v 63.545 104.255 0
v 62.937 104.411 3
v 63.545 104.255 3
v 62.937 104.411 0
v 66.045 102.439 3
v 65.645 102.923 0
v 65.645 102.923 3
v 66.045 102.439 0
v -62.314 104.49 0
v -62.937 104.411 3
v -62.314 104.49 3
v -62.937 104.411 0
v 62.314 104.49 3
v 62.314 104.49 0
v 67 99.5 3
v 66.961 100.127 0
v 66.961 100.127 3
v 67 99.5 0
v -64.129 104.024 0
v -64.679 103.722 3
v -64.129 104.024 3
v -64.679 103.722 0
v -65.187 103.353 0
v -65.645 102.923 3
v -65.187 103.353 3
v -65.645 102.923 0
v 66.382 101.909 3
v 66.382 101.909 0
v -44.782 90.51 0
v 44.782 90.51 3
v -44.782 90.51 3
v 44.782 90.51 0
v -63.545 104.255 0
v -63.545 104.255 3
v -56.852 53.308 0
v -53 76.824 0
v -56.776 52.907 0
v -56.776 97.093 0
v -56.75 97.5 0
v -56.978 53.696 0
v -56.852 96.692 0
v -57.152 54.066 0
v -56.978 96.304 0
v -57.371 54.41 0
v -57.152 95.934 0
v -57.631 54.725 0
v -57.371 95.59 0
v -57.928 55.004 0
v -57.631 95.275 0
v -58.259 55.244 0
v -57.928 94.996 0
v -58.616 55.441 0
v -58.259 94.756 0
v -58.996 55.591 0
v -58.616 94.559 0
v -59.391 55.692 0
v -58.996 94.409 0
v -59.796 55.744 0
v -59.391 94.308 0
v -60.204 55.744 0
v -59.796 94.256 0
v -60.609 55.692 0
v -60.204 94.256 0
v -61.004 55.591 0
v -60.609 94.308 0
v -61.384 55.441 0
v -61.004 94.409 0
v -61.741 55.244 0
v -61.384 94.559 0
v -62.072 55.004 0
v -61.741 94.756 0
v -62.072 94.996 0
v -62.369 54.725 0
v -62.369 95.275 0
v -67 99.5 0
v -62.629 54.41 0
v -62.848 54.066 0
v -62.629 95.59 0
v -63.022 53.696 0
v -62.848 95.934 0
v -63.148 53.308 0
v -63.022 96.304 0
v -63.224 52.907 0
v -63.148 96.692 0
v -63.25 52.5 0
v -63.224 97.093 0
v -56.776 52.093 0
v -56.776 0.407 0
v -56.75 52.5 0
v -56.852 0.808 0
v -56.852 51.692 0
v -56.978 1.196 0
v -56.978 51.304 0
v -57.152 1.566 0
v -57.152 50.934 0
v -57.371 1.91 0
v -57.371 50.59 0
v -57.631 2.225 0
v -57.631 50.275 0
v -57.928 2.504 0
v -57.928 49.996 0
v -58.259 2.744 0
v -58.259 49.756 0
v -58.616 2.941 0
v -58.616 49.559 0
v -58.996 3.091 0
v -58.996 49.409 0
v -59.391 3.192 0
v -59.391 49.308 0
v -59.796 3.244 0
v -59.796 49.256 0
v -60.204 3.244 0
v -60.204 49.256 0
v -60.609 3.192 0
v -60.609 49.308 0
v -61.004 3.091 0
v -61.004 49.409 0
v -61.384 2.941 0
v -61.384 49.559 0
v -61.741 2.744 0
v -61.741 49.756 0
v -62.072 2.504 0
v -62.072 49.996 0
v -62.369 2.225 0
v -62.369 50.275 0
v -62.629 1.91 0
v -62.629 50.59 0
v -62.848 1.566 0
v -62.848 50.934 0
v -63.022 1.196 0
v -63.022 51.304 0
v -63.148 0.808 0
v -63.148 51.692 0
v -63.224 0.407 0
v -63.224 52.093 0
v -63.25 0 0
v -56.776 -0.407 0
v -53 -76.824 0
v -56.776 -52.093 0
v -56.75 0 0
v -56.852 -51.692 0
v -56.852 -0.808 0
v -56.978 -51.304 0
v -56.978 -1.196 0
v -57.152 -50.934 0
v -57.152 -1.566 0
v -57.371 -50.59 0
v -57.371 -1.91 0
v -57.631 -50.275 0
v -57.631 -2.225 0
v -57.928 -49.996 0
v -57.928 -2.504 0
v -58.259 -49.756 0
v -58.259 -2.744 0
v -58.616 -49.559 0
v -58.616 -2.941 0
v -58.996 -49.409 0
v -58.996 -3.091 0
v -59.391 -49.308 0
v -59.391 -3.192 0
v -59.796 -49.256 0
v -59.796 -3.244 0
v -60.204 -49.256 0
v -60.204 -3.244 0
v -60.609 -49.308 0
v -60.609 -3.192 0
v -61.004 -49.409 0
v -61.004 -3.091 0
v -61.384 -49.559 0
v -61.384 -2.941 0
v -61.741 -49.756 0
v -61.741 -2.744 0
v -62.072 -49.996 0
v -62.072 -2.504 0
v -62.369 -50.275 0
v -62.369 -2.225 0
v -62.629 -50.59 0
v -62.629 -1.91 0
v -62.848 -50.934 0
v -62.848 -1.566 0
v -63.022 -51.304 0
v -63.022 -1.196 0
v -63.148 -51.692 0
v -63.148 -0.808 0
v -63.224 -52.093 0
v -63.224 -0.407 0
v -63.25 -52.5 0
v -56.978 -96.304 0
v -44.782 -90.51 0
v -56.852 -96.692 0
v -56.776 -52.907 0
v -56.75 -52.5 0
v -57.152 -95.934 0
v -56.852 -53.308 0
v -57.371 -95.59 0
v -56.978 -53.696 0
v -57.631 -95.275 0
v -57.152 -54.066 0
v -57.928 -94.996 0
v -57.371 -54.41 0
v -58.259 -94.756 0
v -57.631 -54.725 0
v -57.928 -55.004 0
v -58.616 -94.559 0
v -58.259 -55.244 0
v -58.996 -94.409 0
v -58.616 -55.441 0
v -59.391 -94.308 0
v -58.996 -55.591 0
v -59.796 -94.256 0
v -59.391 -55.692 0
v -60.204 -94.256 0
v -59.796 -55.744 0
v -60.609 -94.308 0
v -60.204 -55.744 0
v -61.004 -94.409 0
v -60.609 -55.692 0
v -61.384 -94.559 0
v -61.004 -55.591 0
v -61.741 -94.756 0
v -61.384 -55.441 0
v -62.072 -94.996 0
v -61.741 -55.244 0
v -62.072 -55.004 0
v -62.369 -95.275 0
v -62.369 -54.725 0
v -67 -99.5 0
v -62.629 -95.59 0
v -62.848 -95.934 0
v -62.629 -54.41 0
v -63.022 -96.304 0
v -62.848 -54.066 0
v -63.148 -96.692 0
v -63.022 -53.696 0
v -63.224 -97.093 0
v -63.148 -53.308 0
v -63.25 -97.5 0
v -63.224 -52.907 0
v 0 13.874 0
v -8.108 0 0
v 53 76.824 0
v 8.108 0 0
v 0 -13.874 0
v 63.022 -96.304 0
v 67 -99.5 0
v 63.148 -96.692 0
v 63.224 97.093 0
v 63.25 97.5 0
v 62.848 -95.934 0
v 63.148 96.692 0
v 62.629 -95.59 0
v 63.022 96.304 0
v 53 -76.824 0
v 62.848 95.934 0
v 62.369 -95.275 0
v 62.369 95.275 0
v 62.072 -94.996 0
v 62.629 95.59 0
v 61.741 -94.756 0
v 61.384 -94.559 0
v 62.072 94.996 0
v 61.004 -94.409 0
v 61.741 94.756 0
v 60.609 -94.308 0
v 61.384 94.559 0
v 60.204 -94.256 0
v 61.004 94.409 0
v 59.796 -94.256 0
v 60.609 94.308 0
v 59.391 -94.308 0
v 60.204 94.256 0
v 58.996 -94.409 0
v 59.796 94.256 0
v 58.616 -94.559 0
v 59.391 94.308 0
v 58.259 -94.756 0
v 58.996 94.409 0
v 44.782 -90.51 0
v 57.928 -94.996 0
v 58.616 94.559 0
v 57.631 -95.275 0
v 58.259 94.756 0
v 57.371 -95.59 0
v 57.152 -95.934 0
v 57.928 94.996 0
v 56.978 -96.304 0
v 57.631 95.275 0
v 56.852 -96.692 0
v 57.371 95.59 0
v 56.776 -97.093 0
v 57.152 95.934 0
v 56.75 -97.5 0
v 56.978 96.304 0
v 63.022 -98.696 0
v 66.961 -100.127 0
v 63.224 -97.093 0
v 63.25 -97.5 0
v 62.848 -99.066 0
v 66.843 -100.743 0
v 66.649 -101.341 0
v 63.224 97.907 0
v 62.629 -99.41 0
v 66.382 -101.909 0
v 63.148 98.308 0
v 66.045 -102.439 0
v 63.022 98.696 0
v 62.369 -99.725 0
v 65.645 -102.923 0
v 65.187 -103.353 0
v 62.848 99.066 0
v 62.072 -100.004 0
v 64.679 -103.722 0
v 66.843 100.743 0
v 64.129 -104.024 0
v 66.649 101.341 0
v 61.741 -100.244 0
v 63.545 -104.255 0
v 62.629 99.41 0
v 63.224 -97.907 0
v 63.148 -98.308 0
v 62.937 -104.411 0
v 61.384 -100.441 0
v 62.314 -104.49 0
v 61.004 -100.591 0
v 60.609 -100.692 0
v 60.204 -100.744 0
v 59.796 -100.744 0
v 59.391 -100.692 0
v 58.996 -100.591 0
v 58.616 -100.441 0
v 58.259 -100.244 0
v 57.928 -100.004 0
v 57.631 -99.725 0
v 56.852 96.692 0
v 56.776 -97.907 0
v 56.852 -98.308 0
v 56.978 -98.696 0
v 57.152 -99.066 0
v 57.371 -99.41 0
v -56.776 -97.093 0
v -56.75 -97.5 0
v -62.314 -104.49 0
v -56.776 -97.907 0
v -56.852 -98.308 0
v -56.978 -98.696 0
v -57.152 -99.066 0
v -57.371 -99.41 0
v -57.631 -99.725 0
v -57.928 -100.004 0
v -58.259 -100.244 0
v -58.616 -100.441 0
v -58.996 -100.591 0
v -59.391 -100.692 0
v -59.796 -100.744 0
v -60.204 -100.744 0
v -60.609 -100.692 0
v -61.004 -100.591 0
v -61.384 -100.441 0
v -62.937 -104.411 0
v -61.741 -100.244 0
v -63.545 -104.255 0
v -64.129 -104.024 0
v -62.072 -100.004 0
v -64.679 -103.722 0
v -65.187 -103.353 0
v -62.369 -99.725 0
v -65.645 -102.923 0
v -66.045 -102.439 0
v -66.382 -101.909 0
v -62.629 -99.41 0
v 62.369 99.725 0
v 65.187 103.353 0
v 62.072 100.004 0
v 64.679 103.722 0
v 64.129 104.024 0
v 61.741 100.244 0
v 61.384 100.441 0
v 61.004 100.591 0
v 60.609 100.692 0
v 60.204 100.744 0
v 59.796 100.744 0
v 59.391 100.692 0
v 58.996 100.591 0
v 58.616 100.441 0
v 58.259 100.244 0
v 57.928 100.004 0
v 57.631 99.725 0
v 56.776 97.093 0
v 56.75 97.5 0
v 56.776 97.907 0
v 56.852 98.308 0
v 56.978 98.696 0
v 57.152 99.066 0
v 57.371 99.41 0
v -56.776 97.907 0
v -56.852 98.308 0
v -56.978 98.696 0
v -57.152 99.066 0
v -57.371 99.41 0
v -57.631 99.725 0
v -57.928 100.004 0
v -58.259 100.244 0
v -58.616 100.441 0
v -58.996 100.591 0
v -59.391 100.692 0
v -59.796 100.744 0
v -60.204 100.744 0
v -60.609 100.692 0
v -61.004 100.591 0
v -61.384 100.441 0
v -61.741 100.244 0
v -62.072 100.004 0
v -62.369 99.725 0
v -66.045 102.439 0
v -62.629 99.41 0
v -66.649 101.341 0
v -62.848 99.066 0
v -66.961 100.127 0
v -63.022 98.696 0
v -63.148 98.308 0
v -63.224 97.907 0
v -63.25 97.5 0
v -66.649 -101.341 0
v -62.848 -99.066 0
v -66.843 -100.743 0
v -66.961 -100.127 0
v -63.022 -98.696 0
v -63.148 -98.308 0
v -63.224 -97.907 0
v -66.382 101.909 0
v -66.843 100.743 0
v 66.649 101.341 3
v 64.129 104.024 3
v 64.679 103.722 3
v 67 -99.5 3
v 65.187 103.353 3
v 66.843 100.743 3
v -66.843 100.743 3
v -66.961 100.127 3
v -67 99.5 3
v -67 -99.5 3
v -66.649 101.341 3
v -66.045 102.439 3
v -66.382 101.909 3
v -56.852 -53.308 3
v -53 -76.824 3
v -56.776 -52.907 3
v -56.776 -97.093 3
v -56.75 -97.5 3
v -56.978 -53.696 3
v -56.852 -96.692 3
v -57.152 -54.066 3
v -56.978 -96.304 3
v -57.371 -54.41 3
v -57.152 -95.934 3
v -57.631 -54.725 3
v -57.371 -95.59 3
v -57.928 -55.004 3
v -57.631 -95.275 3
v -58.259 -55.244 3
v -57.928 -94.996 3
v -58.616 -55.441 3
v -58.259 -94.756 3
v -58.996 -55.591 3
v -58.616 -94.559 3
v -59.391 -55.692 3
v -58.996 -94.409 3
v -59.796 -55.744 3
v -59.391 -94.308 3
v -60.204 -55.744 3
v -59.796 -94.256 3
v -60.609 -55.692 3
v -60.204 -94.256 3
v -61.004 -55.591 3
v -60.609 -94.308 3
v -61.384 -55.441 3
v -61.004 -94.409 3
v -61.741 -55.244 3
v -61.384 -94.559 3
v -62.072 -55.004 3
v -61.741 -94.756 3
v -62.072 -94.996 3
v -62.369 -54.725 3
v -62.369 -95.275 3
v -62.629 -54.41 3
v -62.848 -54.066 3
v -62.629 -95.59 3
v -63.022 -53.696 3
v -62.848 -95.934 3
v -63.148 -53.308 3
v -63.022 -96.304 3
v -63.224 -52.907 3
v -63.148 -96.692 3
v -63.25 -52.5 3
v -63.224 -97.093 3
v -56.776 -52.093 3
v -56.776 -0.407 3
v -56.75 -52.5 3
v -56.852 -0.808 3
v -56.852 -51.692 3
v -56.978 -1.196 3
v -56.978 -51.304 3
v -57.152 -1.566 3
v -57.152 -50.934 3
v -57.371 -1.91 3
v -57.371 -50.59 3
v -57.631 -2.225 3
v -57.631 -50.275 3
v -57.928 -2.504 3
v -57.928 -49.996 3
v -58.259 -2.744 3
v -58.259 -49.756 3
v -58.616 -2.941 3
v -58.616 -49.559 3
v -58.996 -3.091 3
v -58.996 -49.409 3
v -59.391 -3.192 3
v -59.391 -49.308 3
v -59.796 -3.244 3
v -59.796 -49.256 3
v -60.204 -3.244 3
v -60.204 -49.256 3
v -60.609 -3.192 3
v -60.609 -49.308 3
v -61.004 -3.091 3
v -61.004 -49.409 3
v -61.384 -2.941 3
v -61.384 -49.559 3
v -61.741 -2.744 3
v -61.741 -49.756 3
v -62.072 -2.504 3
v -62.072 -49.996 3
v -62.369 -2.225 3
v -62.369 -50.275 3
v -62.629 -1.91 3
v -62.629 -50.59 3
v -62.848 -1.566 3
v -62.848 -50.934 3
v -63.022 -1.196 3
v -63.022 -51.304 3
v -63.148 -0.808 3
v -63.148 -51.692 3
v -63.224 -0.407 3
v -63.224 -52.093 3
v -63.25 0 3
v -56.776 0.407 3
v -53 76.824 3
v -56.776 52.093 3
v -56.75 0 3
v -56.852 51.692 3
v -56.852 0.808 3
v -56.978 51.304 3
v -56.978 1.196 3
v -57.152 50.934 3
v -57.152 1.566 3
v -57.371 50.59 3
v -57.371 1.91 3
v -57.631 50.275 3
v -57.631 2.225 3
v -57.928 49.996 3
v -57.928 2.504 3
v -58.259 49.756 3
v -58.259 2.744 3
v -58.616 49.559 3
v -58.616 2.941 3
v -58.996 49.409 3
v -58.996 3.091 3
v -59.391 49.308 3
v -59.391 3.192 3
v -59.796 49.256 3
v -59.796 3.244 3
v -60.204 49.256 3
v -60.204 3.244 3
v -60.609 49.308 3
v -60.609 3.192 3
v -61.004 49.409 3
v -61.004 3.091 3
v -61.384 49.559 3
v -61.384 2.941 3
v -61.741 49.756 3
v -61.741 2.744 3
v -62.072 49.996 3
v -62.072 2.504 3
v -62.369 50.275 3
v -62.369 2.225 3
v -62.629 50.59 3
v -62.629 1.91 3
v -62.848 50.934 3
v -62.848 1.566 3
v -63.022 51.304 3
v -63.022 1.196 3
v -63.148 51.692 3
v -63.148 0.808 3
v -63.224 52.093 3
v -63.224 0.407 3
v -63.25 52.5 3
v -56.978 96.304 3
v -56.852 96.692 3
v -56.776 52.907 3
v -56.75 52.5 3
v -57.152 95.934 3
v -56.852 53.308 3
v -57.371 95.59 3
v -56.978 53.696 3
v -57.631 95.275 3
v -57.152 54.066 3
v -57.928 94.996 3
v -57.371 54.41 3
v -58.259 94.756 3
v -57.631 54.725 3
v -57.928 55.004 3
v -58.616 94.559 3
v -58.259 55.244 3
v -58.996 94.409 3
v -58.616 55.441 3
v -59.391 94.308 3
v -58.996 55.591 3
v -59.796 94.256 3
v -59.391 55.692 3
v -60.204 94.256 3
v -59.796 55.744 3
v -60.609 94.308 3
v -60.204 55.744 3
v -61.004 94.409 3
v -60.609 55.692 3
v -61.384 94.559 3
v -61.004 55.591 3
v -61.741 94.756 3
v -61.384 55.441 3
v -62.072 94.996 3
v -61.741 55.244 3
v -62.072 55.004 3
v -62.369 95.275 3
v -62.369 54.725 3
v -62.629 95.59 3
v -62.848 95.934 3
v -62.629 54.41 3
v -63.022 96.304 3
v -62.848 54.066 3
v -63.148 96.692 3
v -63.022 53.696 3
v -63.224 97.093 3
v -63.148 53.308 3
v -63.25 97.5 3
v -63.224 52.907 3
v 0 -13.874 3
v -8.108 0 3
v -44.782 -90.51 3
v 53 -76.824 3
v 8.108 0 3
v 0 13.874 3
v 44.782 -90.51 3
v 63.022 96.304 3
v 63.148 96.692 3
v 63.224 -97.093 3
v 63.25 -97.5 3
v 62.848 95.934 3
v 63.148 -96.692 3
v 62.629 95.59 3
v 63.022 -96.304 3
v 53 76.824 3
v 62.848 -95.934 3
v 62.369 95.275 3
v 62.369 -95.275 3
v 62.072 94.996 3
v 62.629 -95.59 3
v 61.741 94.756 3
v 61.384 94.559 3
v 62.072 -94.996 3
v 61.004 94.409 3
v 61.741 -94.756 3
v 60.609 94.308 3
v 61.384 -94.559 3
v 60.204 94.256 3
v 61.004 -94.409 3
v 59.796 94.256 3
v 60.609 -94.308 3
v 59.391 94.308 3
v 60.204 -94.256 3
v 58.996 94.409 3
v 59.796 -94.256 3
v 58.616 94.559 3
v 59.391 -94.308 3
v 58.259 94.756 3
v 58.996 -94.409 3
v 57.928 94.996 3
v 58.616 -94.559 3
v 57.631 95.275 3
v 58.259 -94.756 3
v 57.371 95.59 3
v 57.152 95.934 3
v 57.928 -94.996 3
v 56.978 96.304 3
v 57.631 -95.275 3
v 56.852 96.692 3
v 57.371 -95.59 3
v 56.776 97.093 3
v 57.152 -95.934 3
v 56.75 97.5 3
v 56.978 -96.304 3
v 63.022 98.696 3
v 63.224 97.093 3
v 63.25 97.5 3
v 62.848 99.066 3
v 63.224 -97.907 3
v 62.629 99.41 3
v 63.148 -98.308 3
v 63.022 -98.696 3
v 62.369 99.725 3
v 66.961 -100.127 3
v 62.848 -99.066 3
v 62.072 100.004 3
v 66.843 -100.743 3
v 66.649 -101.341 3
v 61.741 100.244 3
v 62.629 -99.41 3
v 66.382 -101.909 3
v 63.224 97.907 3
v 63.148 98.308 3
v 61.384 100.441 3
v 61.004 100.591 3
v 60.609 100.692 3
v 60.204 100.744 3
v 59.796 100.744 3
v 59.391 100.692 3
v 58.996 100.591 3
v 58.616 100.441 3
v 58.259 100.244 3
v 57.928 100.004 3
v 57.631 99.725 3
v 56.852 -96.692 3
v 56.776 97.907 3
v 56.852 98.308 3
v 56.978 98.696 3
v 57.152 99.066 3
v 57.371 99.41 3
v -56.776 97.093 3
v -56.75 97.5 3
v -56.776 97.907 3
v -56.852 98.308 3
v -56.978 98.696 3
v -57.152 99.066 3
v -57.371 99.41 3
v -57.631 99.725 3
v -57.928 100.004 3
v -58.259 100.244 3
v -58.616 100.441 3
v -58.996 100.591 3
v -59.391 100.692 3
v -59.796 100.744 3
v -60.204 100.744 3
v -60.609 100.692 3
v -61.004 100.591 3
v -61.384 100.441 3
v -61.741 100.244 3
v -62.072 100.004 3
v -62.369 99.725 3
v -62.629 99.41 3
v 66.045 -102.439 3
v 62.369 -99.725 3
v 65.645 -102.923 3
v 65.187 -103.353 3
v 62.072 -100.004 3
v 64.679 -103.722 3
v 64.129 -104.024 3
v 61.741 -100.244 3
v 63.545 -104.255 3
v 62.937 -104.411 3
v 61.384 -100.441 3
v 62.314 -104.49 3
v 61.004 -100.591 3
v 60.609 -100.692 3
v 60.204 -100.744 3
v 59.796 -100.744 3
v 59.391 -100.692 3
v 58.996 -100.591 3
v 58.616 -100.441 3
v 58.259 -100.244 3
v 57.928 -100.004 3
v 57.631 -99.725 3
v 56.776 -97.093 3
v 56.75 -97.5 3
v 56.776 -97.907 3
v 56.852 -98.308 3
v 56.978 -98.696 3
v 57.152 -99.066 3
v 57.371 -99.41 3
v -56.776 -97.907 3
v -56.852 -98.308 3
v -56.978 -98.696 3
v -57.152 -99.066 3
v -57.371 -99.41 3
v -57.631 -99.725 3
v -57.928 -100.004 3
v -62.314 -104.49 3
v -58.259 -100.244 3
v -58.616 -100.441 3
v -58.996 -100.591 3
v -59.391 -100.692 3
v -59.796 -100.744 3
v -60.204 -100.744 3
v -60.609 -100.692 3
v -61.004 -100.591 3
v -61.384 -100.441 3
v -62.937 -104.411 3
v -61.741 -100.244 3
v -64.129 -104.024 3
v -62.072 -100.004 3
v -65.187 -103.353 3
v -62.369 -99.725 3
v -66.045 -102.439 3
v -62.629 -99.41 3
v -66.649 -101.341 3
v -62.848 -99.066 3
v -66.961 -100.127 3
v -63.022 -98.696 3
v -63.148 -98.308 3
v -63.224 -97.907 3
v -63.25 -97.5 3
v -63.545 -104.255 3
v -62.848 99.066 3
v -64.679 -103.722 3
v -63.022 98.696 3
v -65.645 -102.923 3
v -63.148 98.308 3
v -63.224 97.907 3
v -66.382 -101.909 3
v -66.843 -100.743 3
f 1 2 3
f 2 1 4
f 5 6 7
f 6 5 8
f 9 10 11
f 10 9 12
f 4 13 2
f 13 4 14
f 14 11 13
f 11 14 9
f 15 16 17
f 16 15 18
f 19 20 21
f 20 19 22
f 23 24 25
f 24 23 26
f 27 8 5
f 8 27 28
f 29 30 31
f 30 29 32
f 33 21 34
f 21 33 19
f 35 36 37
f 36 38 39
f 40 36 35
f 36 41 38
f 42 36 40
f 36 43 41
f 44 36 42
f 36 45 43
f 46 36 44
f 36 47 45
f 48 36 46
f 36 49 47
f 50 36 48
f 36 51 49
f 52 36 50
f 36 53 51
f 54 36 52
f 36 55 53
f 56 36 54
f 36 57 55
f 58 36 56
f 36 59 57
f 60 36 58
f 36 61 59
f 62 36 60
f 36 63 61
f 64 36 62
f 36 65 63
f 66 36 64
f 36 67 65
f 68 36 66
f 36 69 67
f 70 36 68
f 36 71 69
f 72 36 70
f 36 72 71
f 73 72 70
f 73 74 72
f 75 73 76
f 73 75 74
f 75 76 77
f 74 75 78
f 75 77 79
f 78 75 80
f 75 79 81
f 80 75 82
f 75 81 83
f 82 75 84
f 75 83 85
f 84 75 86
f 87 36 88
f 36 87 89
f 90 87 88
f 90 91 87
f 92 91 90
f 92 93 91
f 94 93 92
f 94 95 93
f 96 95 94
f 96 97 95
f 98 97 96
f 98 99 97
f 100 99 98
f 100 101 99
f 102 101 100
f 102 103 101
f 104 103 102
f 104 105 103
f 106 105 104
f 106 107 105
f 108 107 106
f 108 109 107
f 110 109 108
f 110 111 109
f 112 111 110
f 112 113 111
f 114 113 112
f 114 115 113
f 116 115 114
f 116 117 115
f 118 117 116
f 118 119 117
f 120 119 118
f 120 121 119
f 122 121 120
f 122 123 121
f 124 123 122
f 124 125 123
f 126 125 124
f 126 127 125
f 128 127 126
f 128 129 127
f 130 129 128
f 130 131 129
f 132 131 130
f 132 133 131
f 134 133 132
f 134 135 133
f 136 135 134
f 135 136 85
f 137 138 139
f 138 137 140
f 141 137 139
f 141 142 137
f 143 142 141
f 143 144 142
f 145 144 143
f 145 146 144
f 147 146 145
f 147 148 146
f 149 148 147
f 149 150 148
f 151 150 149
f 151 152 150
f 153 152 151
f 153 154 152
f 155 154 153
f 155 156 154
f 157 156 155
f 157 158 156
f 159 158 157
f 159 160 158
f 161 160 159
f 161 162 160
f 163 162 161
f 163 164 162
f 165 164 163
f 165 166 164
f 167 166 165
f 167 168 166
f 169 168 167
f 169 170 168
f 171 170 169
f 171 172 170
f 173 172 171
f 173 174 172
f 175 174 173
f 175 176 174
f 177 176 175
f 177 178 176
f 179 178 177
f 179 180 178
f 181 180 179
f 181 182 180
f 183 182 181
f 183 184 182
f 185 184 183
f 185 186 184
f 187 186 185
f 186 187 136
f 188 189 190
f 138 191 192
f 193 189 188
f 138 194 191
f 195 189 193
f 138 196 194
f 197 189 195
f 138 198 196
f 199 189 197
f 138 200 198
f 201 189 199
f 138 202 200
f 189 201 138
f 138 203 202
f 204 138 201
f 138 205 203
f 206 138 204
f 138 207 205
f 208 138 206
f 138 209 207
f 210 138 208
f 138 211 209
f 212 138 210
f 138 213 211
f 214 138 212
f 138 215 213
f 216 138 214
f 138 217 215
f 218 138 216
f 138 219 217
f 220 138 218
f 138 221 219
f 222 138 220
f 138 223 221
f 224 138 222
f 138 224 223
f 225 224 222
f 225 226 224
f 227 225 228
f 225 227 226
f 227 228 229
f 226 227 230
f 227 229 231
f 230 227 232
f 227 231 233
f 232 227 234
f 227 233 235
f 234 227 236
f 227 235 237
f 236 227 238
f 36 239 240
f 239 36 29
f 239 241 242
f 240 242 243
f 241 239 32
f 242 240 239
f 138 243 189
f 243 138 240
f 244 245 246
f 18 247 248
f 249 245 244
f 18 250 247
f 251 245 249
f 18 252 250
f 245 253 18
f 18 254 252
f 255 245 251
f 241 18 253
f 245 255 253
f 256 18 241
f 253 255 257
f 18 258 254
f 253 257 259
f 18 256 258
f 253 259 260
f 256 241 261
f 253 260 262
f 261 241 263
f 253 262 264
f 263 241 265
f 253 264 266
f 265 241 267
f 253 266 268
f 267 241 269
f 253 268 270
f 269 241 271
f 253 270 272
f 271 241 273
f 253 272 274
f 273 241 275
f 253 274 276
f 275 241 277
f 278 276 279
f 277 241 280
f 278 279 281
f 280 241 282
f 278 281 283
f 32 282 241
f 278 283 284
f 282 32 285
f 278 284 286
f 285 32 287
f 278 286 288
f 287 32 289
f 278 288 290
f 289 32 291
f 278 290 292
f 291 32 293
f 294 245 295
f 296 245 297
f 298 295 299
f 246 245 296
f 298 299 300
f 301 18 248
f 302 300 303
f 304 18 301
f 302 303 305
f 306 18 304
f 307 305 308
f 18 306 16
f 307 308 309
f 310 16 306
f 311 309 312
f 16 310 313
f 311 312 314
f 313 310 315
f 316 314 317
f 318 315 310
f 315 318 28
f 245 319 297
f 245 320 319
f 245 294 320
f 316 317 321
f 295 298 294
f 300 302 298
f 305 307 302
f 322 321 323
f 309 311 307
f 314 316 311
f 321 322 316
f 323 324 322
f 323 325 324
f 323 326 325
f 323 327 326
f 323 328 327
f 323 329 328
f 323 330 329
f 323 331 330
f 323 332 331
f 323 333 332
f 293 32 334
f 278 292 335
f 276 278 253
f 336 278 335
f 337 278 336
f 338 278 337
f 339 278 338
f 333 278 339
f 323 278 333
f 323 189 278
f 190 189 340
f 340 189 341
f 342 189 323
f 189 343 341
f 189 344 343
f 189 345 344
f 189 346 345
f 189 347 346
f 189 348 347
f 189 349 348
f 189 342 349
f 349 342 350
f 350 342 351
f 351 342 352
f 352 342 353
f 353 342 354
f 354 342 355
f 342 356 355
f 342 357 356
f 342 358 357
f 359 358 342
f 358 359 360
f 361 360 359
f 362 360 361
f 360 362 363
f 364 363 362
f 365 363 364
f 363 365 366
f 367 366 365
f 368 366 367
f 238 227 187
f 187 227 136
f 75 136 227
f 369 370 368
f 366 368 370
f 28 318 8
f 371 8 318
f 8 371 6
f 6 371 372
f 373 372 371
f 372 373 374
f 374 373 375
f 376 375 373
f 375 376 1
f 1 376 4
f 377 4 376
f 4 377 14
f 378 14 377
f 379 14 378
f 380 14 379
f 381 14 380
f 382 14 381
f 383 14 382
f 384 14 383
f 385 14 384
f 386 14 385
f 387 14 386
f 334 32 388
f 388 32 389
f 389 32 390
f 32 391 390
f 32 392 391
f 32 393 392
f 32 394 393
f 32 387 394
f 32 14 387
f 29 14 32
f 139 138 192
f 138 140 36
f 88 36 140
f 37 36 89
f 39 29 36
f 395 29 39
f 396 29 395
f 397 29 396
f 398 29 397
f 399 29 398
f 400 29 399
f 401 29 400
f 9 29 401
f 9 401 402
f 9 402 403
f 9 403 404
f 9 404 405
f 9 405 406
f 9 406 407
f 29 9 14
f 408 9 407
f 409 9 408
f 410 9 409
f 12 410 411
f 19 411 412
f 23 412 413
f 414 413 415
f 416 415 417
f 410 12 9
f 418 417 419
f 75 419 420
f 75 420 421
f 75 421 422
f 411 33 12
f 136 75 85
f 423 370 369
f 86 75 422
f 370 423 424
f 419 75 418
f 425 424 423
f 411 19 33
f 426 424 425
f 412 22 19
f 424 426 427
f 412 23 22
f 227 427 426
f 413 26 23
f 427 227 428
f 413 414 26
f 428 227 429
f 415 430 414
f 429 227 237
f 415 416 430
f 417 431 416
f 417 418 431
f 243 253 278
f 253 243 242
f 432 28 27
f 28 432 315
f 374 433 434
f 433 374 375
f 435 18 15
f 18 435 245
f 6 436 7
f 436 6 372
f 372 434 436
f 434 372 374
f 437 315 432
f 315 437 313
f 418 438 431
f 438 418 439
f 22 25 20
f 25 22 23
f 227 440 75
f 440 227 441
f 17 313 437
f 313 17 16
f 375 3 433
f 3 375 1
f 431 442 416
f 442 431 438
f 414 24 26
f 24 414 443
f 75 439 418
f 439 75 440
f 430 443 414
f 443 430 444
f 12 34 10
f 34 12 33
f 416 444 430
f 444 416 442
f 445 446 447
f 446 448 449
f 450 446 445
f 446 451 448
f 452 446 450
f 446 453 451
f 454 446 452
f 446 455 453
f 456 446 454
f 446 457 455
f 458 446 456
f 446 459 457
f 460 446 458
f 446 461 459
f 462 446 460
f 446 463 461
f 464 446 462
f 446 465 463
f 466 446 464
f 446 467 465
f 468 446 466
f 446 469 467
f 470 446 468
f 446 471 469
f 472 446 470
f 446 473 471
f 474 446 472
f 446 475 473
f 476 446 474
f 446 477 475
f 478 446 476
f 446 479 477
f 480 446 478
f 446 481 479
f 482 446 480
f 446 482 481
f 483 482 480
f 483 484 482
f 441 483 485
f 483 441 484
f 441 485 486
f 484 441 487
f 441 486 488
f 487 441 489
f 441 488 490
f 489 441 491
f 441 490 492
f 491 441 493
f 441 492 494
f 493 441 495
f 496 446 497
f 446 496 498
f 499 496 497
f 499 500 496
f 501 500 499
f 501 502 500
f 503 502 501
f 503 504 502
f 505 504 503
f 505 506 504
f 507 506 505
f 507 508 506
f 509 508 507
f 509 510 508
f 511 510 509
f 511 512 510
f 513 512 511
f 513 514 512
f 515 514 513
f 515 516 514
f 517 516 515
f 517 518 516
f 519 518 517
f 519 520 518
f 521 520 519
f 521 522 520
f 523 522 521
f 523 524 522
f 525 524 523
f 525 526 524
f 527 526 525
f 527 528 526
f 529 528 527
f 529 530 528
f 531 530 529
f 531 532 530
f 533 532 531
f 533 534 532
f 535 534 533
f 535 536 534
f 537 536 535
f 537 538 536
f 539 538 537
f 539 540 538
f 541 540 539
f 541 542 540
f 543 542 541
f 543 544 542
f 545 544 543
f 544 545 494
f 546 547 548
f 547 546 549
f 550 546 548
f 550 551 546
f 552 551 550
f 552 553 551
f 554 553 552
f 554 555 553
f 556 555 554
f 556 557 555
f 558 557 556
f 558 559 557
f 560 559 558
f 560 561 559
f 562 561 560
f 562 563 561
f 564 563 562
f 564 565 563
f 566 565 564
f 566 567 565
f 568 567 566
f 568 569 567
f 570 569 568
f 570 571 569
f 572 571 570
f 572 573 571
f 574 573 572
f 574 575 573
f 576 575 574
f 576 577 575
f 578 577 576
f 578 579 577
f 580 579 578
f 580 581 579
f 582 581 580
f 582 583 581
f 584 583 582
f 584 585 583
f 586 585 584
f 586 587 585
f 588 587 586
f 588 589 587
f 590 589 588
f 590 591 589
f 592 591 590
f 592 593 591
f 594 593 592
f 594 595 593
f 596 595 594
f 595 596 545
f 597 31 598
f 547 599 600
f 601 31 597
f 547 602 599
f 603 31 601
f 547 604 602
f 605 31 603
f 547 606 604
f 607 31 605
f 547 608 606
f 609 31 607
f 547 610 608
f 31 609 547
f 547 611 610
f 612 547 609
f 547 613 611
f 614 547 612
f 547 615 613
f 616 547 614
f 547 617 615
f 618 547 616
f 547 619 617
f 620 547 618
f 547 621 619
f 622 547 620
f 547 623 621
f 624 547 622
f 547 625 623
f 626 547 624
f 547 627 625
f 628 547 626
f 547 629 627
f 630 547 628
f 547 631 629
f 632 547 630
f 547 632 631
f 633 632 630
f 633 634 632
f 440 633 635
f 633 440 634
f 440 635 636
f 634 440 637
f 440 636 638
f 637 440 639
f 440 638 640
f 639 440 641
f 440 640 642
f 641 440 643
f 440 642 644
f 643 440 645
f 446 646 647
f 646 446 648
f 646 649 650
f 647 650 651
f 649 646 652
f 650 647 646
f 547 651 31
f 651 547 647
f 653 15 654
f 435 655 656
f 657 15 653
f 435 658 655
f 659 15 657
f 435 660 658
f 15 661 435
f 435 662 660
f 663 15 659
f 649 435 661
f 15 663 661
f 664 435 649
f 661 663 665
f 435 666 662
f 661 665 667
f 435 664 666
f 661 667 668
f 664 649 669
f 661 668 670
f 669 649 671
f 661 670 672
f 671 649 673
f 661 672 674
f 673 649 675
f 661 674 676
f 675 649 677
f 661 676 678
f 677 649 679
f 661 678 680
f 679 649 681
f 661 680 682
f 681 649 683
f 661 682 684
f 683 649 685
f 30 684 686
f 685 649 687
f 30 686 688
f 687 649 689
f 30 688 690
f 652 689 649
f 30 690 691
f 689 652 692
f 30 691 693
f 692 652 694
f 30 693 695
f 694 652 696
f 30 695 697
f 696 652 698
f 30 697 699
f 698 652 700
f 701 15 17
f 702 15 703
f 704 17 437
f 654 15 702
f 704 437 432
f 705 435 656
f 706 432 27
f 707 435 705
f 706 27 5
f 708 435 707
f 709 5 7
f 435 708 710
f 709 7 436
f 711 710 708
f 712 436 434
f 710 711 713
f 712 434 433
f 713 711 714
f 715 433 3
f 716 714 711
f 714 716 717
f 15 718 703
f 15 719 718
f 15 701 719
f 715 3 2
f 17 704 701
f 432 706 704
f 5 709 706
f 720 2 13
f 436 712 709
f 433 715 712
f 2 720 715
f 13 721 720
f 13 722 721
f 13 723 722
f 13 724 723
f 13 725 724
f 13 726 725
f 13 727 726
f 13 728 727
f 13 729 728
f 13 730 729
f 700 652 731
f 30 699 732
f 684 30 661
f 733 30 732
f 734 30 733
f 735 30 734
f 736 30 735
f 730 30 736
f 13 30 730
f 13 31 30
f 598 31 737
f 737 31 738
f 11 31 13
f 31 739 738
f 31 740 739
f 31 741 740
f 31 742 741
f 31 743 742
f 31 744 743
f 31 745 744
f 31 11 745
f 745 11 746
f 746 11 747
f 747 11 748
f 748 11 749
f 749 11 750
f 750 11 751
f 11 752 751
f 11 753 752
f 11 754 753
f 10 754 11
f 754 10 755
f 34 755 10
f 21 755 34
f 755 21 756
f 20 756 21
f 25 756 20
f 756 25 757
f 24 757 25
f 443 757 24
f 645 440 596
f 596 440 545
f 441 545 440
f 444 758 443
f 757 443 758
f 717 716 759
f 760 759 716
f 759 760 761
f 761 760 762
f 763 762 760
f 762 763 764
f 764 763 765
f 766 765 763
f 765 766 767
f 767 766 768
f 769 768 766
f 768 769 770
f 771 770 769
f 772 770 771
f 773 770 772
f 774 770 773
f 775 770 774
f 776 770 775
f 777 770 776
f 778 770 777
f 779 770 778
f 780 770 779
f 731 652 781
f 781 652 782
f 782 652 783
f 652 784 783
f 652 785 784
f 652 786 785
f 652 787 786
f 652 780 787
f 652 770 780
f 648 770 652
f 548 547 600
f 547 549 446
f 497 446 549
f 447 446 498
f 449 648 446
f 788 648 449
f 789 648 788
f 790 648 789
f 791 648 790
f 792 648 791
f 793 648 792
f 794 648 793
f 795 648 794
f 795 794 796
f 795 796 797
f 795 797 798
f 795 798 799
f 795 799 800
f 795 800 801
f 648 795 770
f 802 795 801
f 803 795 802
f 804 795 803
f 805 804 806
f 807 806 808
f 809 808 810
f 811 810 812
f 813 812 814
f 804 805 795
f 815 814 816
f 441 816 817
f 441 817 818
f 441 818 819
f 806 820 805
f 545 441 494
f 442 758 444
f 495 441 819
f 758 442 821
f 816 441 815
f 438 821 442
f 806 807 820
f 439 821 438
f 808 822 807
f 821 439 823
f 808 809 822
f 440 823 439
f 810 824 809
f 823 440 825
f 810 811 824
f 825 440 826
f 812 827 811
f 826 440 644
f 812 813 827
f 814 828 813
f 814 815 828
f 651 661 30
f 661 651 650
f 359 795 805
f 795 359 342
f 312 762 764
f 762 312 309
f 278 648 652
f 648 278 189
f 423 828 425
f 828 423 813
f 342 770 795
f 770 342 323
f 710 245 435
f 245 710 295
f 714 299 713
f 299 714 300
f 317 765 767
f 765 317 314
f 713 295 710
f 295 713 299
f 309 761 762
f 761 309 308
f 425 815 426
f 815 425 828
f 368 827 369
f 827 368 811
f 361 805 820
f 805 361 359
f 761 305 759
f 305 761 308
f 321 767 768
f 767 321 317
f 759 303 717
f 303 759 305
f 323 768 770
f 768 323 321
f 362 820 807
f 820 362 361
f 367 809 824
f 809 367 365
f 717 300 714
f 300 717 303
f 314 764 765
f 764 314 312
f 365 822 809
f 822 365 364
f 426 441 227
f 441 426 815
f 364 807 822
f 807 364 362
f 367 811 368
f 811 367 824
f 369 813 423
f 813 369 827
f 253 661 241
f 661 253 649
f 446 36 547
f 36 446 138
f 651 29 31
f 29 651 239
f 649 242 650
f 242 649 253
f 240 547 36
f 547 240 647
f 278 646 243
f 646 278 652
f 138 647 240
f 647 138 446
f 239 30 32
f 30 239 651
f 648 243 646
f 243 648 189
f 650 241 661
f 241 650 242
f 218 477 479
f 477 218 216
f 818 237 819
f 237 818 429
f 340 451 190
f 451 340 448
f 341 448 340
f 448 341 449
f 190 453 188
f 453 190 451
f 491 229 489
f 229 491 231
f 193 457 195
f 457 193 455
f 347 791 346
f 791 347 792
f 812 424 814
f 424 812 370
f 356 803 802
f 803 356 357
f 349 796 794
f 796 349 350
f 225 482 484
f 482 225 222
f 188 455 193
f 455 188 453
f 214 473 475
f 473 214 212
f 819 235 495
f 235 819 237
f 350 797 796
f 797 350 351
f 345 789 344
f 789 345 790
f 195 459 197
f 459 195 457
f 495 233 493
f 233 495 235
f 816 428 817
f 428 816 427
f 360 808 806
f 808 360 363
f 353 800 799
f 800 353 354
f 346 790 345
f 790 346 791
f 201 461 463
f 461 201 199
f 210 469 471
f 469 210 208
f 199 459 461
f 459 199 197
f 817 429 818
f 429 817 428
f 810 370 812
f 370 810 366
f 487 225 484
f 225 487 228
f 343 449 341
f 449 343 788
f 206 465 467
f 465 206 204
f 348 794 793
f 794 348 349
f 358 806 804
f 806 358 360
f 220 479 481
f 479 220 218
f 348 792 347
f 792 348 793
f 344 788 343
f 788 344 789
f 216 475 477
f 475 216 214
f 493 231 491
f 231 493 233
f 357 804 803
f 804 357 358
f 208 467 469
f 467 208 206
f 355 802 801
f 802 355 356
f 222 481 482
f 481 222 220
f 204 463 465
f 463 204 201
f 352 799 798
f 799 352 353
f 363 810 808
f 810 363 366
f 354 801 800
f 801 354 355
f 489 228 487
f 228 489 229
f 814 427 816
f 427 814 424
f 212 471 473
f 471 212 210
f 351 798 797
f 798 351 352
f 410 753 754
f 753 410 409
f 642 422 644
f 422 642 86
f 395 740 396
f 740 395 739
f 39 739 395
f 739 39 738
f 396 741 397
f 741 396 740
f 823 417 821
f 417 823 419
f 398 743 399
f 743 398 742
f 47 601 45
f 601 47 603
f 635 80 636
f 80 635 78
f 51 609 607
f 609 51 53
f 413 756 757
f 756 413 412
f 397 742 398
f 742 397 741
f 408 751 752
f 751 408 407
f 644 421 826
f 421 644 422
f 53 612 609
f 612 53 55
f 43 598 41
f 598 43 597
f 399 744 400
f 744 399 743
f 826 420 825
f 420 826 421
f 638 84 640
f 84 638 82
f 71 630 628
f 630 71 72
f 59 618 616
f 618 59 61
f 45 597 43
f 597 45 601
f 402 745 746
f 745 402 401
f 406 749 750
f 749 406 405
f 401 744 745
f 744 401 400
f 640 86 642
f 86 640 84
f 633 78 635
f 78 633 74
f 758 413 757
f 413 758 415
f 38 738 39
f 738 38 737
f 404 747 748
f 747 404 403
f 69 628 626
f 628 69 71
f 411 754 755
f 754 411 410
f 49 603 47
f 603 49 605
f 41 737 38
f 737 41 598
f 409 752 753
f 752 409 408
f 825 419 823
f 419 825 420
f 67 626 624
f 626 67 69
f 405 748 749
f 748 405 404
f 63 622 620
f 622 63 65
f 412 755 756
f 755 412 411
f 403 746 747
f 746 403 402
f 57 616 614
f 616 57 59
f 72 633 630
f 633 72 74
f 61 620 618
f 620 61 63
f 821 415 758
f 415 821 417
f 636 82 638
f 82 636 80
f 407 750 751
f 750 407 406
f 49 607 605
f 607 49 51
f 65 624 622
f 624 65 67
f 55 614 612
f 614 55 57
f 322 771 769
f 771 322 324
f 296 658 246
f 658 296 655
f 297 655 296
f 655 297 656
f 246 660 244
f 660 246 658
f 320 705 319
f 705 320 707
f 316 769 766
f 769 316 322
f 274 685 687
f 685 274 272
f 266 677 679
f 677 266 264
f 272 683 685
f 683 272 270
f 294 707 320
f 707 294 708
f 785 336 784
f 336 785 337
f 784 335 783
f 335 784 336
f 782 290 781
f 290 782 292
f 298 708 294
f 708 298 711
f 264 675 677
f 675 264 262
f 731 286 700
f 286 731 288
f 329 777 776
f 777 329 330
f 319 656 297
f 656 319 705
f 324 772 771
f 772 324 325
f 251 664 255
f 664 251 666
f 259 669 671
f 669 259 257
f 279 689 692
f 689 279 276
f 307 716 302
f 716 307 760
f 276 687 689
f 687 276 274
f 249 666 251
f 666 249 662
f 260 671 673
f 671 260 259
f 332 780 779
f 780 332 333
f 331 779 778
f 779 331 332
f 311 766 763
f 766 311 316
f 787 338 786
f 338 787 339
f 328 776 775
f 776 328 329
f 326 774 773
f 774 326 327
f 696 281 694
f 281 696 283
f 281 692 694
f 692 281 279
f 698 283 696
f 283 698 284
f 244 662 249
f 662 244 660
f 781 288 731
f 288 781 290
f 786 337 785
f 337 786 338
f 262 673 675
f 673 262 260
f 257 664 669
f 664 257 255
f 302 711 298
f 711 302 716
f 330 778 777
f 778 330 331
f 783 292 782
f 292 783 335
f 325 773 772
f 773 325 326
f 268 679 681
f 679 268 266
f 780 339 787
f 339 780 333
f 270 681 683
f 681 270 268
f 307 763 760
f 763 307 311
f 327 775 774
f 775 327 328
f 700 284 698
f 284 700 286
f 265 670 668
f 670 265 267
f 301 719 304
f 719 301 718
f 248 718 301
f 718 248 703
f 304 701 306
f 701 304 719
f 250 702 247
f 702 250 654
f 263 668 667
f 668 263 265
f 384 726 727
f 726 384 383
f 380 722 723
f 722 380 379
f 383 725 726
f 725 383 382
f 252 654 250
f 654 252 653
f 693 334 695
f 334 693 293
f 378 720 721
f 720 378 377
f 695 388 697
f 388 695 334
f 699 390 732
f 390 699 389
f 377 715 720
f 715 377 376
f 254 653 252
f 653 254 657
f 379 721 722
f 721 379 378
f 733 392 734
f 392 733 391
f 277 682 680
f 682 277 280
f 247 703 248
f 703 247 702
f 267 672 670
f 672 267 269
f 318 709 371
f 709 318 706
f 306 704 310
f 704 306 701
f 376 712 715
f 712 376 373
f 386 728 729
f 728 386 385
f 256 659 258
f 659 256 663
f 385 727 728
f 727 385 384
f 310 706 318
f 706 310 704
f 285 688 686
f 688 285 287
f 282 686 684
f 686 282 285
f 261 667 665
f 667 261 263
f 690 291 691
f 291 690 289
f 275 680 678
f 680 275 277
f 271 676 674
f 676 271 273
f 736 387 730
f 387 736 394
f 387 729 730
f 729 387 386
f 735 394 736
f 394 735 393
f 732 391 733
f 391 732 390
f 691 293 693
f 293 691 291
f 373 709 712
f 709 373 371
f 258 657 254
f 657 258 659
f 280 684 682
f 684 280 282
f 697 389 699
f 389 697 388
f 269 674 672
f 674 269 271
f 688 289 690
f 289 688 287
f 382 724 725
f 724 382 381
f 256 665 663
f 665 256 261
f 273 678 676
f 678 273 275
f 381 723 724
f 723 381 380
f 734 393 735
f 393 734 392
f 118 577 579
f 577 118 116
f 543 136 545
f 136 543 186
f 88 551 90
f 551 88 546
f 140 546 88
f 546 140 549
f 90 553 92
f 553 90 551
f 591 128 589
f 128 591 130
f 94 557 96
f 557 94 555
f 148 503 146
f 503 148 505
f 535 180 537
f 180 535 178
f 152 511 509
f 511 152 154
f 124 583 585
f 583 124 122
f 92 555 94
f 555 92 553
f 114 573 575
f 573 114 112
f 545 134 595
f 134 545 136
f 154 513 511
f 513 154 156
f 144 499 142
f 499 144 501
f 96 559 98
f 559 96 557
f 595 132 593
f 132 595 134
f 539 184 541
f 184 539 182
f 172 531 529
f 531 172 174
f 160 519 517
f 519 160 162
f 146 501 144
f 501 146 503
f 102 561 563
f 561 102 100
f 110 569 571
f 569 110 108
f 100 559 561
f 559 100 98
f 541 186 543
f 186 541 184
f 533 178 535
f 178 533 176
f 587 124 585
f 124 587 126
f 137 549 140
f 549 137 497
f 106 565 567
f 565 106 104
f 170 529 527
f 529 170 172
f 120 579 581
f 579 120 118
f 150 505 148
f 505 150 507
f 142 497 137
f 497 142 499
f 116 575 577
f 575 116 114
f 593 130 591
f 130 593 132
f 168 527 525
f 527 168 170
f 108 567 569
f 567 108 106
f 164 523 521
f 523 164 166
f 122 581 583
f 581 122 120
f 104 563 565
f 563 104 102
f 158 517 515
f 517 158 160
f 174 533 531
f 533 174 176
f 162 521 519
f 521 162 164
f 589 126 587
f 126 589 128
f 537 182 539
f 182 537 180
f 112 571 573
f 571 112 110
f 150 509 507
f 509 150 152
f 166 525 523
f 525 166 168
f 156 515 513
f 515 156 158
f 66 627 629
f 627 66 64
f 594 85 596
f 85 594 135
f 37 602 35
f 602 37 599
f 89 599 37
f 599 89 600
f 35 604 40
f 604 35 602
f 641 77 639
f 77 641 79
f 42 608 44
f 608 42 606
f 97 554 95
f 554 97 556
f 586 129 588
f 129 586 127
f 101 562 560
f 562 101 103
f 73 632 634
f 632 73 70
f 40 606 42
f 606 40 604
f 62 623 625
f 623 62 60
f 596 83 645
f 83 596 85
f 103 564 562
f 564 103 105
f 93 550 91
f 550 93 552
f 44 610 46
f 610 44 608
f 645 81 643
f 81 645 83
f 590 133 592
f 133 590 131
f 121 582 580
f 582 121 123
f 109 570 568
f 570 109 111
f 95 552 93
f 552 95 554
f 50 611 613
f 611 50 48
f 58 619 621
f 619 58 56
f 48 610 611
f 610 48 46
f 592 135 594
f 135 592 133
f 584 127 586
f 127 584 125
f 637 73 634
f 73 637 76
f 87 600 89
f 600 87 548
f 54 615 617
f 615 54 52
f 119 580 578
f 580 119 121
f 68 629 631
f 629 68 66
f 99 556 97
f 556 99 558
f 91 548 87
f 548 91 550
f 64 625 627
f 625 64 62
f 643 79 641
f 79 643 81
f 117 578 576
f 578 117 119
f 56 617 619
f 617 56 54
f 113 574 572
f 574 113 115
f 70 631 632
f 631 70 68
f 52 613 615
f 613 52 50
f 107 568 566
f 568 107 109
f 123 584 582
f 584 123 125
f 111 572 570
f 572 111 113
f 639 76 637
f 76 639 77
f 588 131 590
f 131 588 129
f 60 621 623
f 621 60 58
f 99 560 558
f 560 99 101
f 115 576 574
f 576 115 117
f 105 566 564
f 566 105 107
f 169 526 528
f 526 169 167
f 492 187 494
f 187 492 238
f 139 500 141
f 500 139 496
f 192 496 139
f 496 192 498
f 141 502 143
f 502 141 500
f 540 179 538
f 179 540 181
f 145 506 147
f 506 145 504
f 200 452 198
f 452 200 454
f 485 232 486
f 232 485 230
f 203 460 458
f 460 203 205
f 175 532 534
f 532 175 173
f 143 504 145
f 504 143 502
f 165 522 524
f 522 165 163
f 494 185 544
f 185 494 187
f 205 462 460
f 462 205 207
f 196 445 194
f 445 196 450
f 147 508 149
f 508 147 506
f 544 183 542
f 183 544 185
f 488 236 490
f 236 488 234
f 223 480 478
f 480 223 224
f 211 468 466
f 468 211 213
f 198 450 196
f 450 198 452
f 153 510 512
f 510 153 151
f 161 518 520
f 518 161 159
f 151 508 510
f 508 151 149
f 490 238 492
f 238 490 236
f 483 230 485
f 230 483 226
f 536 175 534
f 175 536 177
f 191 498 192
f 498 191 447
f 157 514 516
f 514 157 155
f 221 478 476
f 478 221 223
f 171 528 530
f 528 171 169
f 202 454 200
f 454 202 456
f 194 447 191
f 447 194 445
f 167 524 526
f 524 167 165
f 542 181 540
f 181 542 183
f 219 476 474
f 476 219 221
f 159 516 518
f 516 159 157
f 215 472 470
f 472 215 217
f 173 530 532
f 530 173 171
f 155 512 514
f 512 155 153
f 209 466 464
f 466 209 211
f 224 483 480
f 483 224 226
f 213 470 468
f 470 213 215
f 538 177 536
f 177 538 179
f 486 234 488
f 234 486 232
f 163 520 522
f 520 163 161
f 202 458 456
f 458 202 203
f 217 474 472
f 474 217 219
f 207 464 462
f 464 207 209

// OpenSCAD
$fn = 50;


difference() {
	union() {
		translate(v = [0, 97.5000000000, 0]) {
			hull() {
				translate(v = [-62.0000000000, 2.0000000000, 0]) {
					cylinder(h = 3, r = 5);
				}
				translate(v = [62.0000000000, 2.0000000000, 0]) {
					cylinder(h = 3, r = 5);
				}
				translate(v = [-62.0000000000, -2.0000000000, 0]) {
					cylinder(h = 3, r = 5);
				}
				translate(v = [62.0000000000, -2.0000000000, 0]) {
					cylinder(h = 3, r = 5);
				}
			}
		}
		translate(v = [0, -97.5000000000, 0]) {
			hull() {
				translate(v = [-62.0000000000, 2.0000000000, 0]) {
					cylinder(h = 3, r = 5);
				}
				translate(v = [62.0000000000, 2.0000000000, 0]) {
					cylinder(h = 3, r = 5);
				}
				translate(v = [-62.0000000000, -2.0000000000, 0]) {
					cylinder(h = 3, r = 5);
				}
				translate(v = [62.0000000000, -2.0000000000, 0]) {
					cylinder(h = 3, r = 5);
				}
			}
		}
		translate(v = [60.0000000000, 0, 0]) {
			hull() {
				translate(v = [-2.0000000000, 99.5000000000, 0]) {
					cylinder(h = 3, r = 5);
				}
				translate(v = [2.0000000000, 99.5000000000, 0]) {
					cylinder(h = 3, r = 5);
				}
				translate(v = [-2.0000000000, -99.5000000000, 0]) {
					cylinder(h = 3, r = 5);
				}
				translate(v = [2.0000000000, -99.5000000000, 0]) {
					cylinder(h = 3, r = 5);
				}
			}
		}
		translate(v = [-60.0000000000, 0, 0]) {
			hull() {
				translate(v = [-2.0000000000, 99.5000000000, 0]) {
					cylinder(h = 3, r = 5);
				}
				translate(v = [2.0000000000, 99.5000000000, 0]) {
					cylinder(h = 3, r = 5);
				}
				translate(v = [-2.0000000000, -99.5000000000, 0]) {
					cylinder(h = 3, r = 5);
				}
				translate(v = [2.0000000000, -99.5000000000, 0]) {
					cylinder(h = 3, r = 5);
				}
			}
		}
		rotate(a = [0, 0, 30.3000000000]) {
			hull() {
				translate(v = [-2.0000000000, 110.0000000000, 0]) {
					cylinder(h = 3, r = 5);
				}
				translate(v = [2.0000000000, 110.0000000000, 0]) {
					cylinder(h = 3, r = 5);
				}
				translate(v = [-2.0000000000, -110.0000000000, 0]) {
					cylinder(h = 3, r = 5);
				}
				translate(v = [2.0000000000, -110.0000000000, 0]) {
					cylinder(h = 3, r = 5);
				}
			}
		}
		rotate(a = [0, 0, 149.7000000000]) {
			hull() {
				translate(v = [-2.0000000000, 110.0000000000, 0]) {
					cylinder(h = 3, r = 5);
				}
				translate(v = [2.0000000000, 110.0000000000, 0]) {
					cylinder(h = 3, r = 5);
				}
				translate(v = [-2.0000000000, -110.0000000000, 0]) {
					cylinder(h = 3, r = 5);
				}
				translate(v = [2.0000000000, -110.0000000000, 0]) {
					cylinder(h = 3, r = 5);
				}
			}
		}
	}
	union() {
		translate(v = [-60.0000000000, -97.5000000000, 0]) {
			cylinder(h = 24, r = 3.2500000000);
		}
		translate(v = [-60.0000000000, 97.5000000000, 0]) {
			cylinder(h = 24, r = 3.2500000000);
		}
		translate(v = [60.0000000000, -97.5000000000, 0]) {
			cylinder(h = 24, r = 3.2500000000);
		}
		translate(v = [60.0000000000, 97.5000000000, 0]) {
			cylinder(h = 24, r = 3.2500000000);
		}
		translate(v = [-60.0000000000, 0.0000000000, 0]) {
			cylinder(h = 24, r = 3.2500000000);
		}
		translate(v = [-60.0000000000, 52.5000000000, 0]) {
			cylinder(h = 24, r = 3.2500000000);
		}
		translate(v = [-60.0000000000, -52.5000000000, 0]) {
			cylinder(h = 24, r = 3.2500000000);
		}
		translate(v = [-60.0000000000, -97.5000000000, 0]) {
			cylinder(h = 24, r = 3.2500000000);
		}
		translate(v = [-60.0000000000, 97.5000000000, 0]) {
			cylinder(h = 24, r = 3.2500000000);
		}
		translate(v = [60.0000000000, -97.5000000000, 0]) {
			cylinder(h = 24, r = 3.2500000000);
		}
		translate(v = [60.0000000000, 97.5000000000, 0]) {
			cylinder(h = 24, r = 3.2500000000);
		}
	}
}
